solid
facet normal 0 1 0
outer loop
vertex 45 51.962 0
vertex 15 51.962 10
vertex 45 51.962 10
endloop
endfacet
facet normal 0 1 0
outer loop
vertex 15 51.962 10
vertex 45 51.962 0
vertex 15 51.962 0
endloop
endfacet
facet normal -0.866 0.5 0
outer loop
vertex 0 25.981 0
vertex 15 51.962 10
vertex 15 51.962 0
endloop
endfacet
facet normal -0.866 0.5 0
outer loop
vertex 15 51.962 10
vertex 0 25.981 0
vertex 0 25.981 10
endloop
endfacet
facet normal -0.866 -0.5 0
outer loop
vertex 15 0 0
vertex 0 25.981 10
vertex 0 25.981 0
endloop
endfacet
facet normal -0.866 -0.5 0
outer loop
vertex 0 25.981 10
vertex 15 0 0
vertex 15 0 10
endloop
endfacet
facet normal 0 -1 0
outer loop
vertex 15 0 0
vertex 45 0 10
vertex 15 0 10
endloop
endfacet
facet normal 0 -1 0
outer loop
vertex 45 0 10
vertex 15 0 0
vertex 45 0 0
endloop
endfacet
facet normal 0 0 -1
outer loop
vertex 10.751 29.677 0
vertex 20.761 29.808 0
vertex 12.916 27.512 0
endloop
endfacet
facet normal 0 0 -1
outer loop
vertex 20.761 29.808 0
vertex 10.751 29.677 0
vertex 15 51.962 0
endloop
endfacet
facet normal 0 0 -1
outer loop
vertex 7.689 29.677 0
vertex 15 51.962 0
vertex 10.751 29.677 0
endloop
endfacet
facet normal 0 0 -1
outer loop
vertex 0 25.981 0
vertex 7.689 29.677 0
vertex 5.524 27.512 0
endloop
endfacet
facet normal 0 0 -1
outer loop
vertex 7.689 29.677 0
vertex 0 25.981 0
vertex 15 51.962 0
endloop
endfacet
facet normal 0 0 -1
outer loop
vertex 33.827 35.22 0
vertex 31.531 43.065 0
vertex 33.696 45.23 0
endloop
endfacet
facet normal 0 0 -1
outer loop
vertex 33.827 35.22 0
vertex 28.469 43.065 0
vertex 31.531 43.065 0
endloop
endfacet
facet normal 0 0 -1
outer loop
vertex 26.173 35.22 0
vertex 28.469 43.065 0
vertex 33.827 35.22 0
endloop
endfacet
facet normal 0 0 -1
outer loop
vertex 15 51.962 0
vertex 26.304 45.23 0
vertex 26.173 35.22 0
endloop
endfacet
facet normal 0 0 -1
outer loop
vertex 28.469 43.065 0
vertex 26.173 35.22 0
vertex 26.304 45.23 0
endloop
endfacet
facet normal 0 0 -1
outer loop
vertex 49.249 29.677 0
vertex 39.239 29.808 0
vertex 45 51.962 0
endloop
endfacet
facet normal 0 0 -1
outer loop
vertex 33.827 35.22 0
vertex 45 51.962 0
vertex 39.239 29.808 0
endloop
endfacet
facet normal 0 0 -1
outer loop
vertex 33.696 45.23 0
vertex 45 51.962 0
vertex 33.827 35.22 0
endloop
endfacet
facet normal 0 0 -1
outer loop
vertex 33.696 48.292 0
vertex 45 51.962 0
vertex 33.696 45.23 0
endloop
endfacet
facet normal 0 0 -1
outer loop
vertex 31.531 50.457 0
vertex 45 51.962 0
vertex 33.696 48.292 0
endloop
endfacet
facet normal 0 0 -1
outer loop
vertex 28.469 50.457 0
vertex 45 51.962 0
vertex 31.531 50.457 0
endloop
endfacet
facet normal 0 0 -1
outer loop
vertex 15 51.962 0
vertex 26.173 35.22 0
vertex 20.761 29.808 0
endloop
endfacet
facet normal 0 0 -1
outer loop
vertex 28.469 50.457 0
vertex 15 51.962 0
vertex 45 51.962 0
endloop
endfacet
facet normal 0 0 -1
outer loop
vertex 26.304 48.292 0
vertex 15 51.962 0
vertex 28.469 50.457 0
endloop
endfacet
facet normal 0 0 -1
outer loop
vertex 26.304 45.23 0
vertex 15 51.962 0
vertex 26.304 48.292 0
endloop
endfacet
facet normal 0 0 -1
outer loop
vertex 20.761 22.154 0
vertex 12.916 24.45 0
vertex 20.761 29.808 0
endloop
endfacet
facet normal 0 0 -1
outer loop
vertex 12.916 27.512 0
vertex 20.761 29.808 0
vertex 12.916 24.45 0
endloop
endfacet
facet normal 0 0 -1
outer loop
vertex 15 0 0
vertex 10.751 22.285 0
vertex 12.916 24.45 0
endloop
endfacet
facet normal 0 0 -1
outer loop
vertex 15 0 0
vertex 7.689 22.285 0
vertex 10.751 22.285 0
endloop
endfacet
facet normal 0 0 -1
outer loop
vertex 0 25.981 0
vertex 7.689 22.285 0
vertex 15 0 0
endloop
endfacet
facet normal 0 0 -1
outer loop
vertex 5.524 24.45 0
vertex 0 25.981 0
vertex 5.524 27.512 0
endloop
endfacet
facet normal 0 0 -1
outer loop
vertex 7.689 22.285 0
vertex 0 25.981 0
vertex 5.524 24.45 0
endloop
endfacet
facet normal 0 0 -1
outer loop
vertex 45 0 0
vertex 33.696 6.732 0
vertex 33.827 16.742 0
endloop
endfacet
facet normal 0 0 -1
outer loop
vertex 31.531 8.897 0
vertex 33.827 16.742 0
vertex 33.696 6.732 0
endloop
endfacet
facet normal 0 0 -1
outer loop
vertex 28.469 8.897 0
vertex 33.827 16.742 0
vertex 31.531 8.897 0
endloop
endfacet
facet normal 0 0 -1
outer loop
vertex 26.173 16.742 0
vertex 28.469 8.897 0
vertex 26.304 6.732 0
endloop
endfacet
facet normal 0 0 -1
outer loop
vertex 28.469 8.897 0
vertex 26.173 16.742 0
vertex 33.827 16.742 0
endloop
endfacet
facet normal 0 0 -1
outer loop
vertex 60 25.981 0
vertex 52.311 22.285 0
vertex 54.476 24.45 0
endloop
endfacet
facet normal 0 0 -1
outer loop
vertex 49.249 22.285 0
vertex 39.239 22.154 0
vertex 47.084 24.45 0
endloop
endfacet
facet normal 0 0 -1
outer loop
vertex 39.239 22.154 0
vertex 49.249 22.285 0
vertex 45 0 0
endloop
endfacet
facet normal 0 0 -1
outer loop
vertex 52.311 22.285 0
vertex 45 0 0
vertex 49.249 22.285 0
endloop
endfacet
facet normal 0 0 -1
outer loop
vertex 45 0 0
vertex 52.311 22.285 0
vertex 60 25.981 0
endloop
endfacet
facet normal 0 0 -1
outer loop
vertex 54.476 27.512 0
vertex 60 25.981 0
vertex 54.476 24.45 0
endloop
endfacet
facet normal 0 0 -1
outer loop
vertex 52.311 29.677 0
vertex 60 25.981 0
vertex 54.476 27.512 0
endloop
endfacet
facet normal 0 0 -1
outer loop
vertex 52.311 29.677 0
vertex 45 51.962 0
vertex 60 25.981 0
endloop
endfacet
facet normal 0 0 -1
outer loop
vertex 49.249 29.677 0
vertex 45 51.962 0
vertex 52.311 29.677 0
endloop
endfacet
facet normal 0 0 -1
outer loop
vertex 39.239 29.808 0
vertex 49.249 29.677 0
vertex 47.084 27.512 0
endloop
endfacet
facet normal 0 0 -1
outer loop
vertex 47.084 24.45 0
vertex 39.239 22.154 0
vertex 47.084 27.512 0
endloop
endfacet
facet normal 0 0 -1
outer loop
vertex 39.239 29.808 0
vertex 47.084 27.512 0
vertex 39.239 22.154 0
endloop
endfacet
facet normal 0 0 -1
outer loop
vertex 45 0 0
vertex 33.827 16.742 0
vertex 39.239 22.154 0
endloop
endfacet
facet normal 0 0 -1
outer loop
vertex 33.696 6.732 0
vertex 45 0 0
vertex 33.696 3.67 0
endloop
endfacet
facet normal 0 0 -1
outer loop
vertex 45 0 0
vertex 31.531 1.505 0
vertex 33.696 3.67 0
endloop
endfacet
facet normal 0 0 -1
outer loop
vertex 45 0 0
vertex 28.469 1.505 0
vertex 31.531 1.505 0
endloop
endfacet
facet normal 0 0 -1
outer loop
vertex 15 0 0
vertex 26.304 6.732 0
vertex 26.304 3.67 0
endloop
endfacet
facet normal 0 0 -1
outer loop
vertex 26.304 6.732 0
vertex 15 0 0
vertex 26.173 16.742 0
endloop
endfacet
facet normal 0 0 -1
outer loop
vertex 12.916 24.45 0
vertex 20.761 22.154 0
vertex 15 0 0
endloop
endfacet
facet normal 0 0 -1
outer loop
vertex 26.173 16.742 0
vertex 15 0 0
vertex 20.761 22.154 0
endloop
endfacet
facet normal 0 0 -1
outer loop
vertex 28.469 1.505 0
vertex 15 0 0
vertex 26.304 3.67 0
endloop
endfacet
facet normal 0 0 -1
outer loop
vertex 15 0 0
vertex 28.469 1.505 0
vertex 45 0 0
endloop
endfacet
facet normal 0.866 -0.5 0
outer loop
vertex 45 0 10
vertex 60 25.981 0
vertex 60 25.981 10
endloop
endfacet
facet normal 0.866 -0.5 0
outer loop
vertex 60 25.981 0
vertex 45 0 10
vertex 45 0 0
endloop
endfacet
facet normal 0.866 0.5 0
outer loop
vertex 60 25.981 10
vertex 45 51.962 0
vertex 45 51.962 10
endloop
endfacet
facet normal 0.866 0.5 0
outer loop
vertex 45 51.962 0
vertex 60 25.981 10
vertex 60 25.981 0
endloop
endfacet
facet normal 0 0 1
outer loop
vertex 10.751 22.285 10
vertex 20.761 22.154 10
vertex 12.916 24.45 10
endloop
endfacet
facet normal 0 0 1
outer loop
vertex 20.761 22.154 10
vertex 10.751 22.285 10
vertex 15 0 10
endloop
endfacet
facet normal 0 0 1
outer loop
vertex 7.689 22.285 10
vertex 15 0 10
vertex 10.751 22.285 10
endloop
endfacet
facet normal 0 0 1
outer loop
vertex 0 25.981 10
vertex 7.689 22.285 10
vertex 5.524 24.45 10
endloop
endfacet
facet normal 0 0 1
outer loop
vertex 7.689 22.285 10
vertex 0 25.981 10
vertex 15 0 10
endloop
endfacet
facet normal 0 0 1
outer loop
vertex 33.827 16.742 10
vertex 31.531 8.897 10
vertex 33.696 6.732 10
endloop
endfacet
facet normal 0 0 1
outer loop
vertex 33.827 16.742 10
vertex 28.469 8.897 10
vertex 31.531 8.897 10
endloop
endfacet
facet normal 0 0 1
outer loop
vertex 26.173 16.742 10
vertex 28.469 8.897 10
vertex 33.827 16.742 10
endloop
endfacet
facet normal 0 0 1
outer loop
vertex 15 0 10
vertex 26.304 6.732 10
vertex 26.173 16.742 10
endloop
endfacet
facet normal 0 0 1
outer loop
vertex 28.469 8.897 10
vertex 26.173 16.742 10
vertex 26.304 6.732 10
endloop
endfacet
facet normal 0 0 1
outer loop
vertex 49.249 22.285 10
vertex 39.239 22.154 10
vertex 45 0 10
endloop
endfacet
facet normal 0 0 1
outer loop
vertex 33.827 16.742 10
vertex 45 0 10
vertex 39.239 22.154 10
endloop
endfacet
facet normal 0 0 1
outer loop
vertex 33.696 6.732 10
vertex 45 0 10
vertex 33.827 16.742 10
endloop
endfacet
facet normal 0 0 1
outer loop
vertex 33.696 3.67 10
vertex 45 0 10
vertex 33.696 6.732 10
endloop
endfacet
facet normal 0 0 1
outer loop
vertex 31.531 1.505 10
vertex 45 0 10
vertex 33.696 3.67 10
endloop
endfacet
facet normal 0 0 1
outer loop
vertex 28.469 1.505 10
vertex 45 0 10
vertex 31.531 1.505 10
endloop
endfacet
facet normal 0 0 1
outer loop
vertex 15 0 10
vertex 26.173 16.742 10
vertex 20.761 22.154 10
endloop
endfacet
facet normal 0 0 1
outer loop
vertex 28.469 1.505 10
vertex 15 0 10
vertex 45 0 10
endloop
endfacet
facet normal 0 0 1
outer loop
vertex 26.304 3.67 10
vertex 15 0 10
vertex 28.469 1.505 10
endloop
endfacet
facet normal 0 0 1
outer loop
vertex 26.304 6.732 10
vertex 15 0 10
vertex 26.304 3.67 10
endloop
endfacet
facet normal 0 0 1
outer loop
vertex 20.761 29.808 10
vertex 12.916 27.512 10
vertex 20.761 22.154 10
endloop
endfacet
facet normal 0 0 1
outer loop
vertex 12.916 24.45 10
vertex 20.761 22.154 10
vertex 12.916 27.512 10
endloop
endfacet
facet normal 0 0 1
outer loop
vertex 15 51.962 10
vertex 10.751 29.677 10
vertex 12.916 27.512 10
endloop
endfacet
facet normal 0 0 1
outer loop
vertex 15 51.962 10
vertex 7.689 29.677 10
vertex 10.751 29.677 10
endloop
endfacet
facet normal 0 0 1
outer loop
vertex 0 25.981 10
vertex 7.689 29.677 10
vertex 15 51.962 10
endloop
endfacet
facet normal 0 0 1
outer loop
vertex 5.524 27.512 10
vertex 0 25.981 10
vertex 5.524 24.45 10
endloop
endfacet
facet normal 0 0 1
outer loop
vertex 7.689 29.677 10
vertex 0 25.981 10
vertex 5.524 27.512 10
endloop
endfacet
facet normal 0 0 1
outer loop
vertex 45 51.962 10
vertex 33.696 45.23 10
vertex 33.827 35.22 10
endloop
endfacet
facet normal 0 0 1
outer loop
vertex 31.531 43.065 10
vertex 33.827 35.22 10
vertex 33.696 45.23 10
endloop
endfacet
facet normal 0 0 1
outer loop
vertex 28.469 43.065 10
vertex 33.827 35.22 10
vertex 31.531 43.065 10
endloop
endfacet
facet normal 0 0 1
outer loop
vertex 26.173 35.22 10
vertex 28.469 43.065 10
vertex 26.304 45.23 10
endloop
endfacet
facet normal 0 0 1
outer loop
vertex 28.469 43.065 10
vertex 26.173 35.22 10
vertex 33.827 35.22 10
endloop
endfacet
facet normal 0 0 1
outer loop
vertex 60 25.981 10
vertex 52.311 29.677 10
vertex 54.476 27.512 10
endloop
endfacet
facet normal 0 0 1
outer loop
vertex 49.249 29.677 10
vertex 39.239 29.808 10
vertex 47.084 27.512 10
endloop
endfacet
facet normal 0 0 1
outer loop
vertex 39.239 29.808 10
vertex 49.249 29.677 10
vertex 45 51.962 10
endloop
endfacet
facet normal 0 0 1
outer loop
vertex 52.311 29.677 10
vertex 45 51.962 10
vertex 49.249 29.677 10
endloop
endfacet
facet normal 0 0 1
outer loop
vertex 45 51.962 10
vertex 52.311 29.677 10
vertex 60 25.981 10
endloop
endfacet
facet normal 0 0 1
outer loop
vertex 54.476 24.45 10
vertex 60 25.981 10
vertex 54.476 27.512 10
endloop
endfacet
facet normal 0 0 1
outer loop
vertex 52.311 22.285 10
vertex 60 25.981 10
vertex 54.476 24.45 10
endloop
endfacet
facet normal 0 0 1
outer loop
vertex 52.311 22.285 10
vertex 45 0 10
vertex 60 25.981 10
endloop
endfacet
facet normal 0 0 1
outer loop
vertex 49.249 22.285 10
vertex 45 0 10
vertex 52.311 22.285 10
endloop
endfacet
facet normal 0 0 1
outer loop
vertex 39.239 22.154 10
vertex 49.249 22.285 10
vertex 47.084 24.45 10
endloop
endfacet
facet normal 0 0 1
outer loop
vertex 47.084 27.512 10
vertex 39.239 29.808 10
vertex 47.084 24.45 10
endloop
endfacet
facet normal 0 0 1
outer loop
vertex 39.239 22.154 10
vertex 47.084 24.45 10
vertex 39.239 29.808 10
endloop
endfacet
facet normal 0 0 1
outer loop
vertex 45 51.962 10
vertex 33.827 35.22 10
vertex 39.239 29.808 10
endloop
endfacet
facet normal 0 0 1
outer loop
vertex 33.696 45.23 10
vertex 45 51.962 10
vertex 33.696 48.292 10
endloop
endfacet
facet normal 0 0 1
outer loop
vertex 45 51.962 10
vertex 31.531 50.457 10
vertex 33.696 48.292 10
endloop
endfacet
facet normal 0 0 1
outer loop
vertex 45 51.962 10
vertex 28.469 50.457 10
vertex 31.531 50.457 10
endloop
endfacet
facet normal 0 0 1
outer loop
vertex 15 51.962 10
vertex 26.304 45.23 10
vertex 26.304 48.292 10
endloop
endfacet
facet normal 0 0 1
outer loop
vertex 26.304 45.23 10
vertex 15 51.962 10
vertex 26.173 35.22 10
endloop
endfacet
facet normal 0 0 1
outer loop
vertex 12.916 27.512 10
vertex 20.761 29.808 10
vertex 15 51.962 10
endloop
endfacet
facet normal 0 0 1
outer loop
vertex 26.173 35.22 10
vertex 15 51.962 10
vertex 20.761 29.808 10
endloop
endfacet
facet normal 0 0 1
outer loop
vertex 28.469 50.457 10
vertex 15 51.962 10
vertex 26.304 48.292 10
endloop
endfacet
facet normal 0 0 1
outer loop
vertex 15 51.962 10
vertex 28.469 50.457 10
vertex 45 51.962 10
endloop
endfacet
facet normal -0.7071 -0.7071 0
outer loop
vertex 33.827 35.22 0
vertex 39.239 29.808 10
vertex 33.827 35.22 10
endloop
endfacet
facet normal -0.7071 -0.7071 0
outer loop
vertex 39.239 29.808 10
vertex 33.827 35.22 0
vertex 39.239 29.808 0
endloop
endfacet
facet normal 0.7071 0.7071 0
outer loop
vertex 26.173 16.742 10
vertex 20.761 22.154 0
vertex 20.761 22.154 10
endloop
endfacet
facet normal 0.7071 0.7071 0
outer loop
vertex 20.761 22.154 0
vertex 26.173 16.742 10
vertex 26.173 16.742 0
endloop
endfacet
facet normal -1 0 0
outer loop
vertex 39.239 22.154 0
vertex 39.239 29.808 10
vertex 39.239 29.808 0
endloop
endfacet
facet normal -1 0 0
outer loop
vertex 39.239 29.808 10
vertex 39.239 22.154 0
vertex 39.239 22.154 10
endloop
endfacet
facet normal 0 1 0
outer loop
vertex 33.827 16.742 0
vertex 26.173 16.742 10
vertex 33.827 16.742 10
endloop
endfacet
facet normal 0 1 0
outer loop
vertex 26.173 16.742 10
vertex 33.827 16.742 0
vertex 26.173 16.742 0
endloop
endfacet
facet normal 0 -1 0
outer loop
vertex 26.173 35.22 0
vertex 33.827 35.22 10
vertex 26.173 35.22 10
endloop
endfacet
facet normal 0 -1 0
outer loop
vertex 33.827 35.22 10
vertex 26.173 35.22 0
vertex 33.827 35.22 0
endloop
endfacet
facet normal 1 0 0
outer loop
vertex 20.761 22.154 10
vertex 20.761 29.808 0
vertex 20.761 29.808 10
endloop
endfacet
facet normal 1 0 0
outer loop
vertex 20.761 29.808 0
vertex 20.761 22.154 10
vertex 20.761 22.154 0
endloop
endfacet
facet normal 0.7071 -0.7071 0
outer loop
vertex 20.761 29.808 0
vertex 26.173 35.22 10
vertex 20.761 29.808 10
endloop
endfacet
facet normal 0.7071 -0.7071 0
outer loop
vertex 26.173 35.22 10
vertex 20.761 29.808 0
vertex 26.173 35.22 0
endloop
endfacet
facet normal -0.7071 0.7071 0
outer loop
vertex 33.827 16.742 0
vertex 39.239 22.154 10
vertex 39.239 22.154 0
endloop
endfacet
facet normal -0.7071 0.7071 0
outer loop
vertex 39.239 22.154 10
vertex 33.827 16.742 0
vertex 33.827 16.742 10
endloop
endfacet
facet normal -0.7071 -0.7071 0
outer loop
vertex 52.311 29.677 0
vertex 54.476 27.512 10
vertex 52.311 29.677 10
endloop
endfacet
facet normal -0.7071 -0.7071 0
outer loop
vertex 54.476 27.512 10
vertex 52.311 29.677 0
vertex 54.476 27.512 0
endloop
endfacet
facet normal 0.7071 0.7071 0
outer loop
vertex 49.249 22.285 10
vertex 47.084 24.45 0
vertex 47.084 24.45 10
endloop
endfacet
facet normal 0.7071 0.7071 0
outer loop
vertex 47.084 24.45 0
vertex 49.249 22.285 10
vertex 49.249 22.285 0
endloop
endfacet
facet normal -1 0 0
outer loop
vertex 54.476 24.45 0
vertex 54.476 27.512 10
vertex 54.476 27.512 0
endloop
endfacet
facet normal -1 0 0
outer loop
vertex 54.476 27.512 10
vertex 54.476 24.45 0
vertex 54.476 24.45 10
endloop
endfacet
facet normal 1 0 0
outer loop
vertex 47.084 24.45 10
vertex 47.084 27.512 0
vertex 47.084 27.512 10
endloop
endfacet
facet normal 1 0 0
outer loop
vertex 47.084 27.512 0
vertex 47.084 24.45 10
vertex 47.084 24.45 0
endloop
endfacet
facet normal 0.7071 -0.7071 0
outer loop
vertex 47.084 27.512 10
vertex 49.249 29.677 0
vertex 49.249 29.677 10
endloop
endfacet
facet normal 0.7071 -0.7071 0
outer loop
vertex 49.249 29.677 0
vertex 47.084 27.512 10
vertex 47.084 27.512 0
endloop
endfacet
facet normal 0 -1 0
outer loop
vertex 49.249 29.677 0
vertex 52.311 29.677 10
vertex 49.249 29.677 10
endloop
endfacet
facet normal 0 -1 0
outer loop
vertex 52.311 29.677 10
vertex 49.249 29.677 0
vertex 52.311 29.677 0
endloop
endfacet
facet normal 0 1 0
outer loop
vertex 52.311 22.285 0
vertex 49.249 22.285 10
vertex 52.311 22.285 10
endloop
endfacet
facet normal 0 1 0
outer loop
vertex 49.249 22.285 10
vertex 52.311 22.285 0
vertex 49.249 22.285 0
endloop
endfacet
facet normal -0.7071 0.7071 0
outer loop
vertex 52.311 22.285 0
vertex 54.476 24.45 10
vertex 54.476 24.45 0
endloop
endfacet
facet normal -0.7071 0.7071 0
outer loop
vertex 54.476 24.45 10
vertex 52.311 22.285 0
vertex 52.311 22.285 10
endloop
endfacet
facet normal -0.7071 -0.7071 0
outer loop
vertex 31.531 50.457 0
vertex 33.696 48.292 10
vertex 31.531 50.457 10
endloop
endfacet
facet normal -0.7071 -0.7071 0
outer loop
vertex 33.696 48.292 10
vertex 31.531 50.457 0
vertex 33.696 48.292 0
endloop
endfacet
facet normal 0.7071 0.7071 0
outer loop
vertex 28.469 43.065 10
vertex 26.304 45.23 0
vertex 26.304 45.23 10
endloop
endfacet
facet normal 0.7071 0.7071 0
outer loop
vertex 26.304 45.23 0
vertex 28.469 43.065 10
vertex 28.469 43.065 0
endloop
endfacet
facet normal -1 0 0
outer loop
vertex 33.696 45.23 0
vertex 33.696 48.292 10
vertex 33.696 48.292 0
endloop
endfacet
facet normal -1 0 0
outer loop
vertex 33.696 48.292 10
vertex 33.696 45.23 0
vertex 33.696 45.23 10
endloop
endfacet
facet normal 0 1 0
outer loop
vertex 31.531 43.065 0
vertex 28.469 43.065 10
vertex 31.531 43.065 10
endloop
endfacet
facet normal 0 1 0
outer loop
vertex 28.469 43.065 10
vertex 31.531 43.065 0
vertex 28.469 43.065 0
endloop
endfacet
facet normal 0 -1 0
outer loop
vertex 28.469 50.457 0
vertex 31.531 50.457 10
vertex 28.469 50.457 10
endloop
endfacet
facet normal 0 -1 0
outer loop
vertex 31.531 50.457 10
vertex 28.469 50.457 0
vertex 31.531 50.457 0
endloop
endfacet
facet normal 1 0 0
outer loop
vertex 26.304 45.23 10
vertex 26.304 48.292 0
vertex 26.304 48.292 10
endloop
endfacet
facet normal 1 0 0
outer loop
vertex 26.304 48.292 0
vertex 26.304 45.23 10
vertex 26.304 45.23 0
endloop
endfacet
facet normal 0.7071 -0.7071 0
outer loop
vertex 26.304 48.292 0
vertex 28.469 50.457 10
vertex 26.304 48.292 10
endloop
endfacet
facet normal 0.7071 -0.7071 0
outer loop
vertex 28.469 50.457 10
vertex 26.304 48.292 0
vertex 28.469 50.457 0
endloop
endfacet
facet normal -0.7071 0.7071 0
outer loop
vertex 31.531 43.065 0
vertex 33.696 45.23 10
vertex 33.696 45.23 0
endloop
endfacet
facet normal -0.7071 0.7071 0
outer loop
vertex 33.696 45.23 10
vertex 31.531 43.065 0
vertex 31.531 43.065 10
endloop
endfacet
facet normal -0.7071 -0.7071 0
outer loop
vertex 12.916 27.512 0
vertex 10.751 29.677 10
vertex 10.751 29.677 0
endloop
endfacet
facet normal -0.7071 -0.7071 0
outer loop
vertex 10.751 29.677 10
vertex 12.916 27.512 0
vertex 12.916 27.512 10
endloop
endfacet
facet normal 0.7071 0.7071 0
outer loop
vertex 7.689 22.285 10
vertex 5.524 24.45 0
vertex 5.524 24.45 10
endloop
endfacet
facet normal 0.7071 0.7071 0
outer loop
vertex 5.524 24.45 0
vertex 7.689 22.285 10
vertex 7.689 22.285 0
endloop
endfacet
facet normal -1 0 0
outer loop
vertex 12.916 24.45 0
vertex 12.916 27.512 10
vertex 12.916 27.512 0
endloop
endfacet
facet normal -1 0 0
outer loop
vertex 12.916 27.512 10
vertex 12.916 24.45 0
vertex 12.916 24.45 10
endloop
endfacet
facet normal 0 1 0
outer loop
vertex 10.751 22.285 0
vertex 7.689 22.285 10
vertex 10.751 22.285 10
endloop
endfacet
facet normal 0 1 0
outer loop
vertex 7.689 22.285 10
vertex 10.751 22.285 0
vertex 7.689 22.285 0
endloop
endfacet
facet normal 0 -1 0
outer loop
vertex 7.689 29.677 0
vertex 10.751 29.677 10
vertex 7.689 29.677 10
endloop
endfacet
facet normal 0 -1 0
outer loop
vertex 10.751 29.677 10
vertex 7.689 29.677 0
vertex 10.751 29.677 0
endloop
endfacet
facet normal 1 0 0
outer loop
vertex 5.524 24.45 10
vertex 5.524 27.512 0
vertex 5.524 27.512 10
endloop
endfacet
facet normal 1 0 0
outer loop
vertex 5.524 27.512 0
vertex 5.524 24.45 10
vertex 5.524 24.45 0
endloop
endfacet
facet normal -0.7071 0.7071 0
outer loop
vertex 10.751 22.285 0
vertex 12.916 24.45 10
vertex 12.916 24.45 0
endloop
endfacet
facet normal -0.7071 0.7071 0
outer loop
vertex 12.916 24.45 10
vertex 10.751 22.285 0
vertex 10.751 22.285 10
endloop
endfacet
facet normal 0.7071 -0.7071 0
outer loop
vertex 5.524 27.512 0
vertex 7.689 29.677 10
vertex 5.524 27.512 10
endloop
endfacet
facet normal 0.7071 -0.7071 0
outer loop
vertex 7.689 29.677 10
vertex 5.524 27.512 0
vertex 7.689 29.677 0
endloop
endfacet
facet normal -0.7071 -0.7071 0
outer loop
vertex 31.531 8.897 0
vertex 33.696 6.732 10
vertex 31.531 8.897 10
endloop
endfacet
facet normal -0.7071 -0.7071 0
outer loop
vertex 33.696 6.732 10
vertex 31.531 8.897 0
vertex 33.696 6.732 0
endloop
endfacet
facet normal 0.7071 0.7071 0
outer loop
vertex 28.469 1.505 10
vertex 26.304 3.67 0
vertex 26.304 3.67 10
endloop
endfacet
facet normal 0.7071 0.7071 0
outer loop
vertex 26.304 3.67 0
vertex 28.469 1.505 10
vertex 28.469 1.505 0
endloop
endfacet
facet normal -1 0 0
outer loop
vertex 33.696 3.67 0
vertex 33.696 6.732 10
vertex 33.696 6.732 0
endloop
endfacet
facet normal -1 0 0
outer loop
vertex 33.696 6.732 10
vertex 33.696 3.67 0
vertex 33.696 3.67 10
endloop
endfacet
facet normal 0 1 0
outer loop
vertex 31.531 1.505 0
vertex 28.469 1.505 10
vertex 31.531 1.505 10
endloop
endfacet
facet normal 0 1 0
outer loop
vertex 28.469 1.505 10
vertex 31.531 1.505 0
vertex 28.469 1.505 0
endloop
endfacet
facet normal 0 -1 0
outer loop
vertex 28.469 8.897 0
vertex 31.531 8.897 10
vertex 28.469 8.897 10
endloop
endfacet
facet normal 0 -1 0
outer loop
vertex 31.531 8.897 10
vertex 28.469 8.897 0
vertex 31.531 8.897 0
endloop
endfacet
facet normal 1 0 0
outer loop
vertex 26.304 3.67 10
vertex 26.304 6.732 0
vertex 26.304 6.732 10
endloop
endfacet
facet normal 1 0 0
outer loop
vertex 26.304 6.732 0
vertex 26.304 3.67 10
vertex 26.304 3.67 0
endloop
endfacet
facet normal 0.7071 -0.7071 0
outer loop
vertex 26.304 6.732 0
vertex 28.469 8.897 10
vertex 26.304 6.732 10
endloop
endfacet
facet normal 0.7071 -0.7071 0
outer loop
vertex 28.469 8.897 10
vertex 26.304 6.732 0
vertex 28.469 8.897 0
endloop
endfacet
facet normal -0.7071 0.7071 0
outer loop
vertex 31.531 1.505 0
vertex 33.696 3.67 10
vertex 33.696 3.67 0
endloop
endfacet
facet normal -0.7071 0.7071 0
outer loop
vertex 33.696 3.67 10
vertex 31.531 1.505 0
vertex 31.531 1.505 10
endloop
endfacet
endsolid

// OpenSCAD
$fn = 32;

// ----------------------------------------------------------------------
// Polygon plate: 6-gon R30, 4 bolt windows
// ----------------------------------------------------------------------

// --- parameters (mm) ---
sides = 6;                // number of polygon sides
plate_r = 30;             // circumscribed radius of the polygon
bore_r = 10;              // centre bore radius
bolts = 4;                // number of bolt windows
ring_r = 20.78;           // bolt-circle radius
bolt_r = 4;               // bolt window radius
plate_t = 10;             // plate thickness, Z (extrusion height)

plate_d = 2 * plate_r;  // circumscribed diameter
bore_d = 2 * bore_r;  // centre bore diameter
bolt_d = 2 * bolt_r;  // bolt window diameter
ring_d = 2 * ring_r;  // bolt-circle diameter

profile = [[60, 25.981], [45, 51.962], [15, 51.962], [0, 25.981], [15, 0], [45, 0]];  // primary outline, 6 points, counter clockwise
void_1 = [[39.239, 29.808], [33.827, 35.22], [26.173, 35.22], [20.761, 29.808], [20.761, 22.154], [26.173, 16.742], [33.827, 16.742], [39.239, 22.154]];  // centre bore, 8 points
void_2 = [[54.476, 27.512], [52.311, 29.677], [49.249, 29.677], [47.084, 27.512], [47.084, 24.45], [49.249, 22.285], [52.311, 22.285], [54.476, 24.45]];  // bolt window 1, 8 points
void_3 = [[33.696, 48.292], [31.531, 50.457], [28.469, 50.457], [26.304, 48.292], [26.304, 45.23], [28.469, 43.065], [31.531, 43.065], [33.696, 45.23]];  // bolt window 2, 8 points
void_4 = [[12.916, 27.512], [10.751, 29.677], [7.689, 29.677], [5.524, 27.512], [5.524, 24.45], [7.689, 22.285], [10.751, 22.285], [12.916, 24.45]];  // bolt window 3, 8 points
void_5 = [[33.696, 6.732], [31.531, 8.897], [28.469, 8.897], [26.304, 6.732], [26.304, 3.67], [28.469, 1.505], [31.531, 1.505], [33.696, 3.67]];  // bolt window 4, 8 points

// --- the one profile operation ---
difference() {
  linear_extrude(height = plate_t) polygon(points = profile);
  translate([0, 0, -1])
    linear_extrude(height = plate_t + 2) polygon(points = void_1);
  translate([0, 0, -1])
    linear_extrude(height = plate_t + 2) polygon(points = void_2);
  translate([0, 0, -1])
    linear_extrude(height = plate_t + 2) polygon(points = void_3);
  translate([0, 0, -1])
    linear_extrude(height = plate_t + 2) polygon(points = void_4);
  translate([0, 0, -1])
    linear_extrude(height = plate_t + 2) polygon(points = void_5);
}
